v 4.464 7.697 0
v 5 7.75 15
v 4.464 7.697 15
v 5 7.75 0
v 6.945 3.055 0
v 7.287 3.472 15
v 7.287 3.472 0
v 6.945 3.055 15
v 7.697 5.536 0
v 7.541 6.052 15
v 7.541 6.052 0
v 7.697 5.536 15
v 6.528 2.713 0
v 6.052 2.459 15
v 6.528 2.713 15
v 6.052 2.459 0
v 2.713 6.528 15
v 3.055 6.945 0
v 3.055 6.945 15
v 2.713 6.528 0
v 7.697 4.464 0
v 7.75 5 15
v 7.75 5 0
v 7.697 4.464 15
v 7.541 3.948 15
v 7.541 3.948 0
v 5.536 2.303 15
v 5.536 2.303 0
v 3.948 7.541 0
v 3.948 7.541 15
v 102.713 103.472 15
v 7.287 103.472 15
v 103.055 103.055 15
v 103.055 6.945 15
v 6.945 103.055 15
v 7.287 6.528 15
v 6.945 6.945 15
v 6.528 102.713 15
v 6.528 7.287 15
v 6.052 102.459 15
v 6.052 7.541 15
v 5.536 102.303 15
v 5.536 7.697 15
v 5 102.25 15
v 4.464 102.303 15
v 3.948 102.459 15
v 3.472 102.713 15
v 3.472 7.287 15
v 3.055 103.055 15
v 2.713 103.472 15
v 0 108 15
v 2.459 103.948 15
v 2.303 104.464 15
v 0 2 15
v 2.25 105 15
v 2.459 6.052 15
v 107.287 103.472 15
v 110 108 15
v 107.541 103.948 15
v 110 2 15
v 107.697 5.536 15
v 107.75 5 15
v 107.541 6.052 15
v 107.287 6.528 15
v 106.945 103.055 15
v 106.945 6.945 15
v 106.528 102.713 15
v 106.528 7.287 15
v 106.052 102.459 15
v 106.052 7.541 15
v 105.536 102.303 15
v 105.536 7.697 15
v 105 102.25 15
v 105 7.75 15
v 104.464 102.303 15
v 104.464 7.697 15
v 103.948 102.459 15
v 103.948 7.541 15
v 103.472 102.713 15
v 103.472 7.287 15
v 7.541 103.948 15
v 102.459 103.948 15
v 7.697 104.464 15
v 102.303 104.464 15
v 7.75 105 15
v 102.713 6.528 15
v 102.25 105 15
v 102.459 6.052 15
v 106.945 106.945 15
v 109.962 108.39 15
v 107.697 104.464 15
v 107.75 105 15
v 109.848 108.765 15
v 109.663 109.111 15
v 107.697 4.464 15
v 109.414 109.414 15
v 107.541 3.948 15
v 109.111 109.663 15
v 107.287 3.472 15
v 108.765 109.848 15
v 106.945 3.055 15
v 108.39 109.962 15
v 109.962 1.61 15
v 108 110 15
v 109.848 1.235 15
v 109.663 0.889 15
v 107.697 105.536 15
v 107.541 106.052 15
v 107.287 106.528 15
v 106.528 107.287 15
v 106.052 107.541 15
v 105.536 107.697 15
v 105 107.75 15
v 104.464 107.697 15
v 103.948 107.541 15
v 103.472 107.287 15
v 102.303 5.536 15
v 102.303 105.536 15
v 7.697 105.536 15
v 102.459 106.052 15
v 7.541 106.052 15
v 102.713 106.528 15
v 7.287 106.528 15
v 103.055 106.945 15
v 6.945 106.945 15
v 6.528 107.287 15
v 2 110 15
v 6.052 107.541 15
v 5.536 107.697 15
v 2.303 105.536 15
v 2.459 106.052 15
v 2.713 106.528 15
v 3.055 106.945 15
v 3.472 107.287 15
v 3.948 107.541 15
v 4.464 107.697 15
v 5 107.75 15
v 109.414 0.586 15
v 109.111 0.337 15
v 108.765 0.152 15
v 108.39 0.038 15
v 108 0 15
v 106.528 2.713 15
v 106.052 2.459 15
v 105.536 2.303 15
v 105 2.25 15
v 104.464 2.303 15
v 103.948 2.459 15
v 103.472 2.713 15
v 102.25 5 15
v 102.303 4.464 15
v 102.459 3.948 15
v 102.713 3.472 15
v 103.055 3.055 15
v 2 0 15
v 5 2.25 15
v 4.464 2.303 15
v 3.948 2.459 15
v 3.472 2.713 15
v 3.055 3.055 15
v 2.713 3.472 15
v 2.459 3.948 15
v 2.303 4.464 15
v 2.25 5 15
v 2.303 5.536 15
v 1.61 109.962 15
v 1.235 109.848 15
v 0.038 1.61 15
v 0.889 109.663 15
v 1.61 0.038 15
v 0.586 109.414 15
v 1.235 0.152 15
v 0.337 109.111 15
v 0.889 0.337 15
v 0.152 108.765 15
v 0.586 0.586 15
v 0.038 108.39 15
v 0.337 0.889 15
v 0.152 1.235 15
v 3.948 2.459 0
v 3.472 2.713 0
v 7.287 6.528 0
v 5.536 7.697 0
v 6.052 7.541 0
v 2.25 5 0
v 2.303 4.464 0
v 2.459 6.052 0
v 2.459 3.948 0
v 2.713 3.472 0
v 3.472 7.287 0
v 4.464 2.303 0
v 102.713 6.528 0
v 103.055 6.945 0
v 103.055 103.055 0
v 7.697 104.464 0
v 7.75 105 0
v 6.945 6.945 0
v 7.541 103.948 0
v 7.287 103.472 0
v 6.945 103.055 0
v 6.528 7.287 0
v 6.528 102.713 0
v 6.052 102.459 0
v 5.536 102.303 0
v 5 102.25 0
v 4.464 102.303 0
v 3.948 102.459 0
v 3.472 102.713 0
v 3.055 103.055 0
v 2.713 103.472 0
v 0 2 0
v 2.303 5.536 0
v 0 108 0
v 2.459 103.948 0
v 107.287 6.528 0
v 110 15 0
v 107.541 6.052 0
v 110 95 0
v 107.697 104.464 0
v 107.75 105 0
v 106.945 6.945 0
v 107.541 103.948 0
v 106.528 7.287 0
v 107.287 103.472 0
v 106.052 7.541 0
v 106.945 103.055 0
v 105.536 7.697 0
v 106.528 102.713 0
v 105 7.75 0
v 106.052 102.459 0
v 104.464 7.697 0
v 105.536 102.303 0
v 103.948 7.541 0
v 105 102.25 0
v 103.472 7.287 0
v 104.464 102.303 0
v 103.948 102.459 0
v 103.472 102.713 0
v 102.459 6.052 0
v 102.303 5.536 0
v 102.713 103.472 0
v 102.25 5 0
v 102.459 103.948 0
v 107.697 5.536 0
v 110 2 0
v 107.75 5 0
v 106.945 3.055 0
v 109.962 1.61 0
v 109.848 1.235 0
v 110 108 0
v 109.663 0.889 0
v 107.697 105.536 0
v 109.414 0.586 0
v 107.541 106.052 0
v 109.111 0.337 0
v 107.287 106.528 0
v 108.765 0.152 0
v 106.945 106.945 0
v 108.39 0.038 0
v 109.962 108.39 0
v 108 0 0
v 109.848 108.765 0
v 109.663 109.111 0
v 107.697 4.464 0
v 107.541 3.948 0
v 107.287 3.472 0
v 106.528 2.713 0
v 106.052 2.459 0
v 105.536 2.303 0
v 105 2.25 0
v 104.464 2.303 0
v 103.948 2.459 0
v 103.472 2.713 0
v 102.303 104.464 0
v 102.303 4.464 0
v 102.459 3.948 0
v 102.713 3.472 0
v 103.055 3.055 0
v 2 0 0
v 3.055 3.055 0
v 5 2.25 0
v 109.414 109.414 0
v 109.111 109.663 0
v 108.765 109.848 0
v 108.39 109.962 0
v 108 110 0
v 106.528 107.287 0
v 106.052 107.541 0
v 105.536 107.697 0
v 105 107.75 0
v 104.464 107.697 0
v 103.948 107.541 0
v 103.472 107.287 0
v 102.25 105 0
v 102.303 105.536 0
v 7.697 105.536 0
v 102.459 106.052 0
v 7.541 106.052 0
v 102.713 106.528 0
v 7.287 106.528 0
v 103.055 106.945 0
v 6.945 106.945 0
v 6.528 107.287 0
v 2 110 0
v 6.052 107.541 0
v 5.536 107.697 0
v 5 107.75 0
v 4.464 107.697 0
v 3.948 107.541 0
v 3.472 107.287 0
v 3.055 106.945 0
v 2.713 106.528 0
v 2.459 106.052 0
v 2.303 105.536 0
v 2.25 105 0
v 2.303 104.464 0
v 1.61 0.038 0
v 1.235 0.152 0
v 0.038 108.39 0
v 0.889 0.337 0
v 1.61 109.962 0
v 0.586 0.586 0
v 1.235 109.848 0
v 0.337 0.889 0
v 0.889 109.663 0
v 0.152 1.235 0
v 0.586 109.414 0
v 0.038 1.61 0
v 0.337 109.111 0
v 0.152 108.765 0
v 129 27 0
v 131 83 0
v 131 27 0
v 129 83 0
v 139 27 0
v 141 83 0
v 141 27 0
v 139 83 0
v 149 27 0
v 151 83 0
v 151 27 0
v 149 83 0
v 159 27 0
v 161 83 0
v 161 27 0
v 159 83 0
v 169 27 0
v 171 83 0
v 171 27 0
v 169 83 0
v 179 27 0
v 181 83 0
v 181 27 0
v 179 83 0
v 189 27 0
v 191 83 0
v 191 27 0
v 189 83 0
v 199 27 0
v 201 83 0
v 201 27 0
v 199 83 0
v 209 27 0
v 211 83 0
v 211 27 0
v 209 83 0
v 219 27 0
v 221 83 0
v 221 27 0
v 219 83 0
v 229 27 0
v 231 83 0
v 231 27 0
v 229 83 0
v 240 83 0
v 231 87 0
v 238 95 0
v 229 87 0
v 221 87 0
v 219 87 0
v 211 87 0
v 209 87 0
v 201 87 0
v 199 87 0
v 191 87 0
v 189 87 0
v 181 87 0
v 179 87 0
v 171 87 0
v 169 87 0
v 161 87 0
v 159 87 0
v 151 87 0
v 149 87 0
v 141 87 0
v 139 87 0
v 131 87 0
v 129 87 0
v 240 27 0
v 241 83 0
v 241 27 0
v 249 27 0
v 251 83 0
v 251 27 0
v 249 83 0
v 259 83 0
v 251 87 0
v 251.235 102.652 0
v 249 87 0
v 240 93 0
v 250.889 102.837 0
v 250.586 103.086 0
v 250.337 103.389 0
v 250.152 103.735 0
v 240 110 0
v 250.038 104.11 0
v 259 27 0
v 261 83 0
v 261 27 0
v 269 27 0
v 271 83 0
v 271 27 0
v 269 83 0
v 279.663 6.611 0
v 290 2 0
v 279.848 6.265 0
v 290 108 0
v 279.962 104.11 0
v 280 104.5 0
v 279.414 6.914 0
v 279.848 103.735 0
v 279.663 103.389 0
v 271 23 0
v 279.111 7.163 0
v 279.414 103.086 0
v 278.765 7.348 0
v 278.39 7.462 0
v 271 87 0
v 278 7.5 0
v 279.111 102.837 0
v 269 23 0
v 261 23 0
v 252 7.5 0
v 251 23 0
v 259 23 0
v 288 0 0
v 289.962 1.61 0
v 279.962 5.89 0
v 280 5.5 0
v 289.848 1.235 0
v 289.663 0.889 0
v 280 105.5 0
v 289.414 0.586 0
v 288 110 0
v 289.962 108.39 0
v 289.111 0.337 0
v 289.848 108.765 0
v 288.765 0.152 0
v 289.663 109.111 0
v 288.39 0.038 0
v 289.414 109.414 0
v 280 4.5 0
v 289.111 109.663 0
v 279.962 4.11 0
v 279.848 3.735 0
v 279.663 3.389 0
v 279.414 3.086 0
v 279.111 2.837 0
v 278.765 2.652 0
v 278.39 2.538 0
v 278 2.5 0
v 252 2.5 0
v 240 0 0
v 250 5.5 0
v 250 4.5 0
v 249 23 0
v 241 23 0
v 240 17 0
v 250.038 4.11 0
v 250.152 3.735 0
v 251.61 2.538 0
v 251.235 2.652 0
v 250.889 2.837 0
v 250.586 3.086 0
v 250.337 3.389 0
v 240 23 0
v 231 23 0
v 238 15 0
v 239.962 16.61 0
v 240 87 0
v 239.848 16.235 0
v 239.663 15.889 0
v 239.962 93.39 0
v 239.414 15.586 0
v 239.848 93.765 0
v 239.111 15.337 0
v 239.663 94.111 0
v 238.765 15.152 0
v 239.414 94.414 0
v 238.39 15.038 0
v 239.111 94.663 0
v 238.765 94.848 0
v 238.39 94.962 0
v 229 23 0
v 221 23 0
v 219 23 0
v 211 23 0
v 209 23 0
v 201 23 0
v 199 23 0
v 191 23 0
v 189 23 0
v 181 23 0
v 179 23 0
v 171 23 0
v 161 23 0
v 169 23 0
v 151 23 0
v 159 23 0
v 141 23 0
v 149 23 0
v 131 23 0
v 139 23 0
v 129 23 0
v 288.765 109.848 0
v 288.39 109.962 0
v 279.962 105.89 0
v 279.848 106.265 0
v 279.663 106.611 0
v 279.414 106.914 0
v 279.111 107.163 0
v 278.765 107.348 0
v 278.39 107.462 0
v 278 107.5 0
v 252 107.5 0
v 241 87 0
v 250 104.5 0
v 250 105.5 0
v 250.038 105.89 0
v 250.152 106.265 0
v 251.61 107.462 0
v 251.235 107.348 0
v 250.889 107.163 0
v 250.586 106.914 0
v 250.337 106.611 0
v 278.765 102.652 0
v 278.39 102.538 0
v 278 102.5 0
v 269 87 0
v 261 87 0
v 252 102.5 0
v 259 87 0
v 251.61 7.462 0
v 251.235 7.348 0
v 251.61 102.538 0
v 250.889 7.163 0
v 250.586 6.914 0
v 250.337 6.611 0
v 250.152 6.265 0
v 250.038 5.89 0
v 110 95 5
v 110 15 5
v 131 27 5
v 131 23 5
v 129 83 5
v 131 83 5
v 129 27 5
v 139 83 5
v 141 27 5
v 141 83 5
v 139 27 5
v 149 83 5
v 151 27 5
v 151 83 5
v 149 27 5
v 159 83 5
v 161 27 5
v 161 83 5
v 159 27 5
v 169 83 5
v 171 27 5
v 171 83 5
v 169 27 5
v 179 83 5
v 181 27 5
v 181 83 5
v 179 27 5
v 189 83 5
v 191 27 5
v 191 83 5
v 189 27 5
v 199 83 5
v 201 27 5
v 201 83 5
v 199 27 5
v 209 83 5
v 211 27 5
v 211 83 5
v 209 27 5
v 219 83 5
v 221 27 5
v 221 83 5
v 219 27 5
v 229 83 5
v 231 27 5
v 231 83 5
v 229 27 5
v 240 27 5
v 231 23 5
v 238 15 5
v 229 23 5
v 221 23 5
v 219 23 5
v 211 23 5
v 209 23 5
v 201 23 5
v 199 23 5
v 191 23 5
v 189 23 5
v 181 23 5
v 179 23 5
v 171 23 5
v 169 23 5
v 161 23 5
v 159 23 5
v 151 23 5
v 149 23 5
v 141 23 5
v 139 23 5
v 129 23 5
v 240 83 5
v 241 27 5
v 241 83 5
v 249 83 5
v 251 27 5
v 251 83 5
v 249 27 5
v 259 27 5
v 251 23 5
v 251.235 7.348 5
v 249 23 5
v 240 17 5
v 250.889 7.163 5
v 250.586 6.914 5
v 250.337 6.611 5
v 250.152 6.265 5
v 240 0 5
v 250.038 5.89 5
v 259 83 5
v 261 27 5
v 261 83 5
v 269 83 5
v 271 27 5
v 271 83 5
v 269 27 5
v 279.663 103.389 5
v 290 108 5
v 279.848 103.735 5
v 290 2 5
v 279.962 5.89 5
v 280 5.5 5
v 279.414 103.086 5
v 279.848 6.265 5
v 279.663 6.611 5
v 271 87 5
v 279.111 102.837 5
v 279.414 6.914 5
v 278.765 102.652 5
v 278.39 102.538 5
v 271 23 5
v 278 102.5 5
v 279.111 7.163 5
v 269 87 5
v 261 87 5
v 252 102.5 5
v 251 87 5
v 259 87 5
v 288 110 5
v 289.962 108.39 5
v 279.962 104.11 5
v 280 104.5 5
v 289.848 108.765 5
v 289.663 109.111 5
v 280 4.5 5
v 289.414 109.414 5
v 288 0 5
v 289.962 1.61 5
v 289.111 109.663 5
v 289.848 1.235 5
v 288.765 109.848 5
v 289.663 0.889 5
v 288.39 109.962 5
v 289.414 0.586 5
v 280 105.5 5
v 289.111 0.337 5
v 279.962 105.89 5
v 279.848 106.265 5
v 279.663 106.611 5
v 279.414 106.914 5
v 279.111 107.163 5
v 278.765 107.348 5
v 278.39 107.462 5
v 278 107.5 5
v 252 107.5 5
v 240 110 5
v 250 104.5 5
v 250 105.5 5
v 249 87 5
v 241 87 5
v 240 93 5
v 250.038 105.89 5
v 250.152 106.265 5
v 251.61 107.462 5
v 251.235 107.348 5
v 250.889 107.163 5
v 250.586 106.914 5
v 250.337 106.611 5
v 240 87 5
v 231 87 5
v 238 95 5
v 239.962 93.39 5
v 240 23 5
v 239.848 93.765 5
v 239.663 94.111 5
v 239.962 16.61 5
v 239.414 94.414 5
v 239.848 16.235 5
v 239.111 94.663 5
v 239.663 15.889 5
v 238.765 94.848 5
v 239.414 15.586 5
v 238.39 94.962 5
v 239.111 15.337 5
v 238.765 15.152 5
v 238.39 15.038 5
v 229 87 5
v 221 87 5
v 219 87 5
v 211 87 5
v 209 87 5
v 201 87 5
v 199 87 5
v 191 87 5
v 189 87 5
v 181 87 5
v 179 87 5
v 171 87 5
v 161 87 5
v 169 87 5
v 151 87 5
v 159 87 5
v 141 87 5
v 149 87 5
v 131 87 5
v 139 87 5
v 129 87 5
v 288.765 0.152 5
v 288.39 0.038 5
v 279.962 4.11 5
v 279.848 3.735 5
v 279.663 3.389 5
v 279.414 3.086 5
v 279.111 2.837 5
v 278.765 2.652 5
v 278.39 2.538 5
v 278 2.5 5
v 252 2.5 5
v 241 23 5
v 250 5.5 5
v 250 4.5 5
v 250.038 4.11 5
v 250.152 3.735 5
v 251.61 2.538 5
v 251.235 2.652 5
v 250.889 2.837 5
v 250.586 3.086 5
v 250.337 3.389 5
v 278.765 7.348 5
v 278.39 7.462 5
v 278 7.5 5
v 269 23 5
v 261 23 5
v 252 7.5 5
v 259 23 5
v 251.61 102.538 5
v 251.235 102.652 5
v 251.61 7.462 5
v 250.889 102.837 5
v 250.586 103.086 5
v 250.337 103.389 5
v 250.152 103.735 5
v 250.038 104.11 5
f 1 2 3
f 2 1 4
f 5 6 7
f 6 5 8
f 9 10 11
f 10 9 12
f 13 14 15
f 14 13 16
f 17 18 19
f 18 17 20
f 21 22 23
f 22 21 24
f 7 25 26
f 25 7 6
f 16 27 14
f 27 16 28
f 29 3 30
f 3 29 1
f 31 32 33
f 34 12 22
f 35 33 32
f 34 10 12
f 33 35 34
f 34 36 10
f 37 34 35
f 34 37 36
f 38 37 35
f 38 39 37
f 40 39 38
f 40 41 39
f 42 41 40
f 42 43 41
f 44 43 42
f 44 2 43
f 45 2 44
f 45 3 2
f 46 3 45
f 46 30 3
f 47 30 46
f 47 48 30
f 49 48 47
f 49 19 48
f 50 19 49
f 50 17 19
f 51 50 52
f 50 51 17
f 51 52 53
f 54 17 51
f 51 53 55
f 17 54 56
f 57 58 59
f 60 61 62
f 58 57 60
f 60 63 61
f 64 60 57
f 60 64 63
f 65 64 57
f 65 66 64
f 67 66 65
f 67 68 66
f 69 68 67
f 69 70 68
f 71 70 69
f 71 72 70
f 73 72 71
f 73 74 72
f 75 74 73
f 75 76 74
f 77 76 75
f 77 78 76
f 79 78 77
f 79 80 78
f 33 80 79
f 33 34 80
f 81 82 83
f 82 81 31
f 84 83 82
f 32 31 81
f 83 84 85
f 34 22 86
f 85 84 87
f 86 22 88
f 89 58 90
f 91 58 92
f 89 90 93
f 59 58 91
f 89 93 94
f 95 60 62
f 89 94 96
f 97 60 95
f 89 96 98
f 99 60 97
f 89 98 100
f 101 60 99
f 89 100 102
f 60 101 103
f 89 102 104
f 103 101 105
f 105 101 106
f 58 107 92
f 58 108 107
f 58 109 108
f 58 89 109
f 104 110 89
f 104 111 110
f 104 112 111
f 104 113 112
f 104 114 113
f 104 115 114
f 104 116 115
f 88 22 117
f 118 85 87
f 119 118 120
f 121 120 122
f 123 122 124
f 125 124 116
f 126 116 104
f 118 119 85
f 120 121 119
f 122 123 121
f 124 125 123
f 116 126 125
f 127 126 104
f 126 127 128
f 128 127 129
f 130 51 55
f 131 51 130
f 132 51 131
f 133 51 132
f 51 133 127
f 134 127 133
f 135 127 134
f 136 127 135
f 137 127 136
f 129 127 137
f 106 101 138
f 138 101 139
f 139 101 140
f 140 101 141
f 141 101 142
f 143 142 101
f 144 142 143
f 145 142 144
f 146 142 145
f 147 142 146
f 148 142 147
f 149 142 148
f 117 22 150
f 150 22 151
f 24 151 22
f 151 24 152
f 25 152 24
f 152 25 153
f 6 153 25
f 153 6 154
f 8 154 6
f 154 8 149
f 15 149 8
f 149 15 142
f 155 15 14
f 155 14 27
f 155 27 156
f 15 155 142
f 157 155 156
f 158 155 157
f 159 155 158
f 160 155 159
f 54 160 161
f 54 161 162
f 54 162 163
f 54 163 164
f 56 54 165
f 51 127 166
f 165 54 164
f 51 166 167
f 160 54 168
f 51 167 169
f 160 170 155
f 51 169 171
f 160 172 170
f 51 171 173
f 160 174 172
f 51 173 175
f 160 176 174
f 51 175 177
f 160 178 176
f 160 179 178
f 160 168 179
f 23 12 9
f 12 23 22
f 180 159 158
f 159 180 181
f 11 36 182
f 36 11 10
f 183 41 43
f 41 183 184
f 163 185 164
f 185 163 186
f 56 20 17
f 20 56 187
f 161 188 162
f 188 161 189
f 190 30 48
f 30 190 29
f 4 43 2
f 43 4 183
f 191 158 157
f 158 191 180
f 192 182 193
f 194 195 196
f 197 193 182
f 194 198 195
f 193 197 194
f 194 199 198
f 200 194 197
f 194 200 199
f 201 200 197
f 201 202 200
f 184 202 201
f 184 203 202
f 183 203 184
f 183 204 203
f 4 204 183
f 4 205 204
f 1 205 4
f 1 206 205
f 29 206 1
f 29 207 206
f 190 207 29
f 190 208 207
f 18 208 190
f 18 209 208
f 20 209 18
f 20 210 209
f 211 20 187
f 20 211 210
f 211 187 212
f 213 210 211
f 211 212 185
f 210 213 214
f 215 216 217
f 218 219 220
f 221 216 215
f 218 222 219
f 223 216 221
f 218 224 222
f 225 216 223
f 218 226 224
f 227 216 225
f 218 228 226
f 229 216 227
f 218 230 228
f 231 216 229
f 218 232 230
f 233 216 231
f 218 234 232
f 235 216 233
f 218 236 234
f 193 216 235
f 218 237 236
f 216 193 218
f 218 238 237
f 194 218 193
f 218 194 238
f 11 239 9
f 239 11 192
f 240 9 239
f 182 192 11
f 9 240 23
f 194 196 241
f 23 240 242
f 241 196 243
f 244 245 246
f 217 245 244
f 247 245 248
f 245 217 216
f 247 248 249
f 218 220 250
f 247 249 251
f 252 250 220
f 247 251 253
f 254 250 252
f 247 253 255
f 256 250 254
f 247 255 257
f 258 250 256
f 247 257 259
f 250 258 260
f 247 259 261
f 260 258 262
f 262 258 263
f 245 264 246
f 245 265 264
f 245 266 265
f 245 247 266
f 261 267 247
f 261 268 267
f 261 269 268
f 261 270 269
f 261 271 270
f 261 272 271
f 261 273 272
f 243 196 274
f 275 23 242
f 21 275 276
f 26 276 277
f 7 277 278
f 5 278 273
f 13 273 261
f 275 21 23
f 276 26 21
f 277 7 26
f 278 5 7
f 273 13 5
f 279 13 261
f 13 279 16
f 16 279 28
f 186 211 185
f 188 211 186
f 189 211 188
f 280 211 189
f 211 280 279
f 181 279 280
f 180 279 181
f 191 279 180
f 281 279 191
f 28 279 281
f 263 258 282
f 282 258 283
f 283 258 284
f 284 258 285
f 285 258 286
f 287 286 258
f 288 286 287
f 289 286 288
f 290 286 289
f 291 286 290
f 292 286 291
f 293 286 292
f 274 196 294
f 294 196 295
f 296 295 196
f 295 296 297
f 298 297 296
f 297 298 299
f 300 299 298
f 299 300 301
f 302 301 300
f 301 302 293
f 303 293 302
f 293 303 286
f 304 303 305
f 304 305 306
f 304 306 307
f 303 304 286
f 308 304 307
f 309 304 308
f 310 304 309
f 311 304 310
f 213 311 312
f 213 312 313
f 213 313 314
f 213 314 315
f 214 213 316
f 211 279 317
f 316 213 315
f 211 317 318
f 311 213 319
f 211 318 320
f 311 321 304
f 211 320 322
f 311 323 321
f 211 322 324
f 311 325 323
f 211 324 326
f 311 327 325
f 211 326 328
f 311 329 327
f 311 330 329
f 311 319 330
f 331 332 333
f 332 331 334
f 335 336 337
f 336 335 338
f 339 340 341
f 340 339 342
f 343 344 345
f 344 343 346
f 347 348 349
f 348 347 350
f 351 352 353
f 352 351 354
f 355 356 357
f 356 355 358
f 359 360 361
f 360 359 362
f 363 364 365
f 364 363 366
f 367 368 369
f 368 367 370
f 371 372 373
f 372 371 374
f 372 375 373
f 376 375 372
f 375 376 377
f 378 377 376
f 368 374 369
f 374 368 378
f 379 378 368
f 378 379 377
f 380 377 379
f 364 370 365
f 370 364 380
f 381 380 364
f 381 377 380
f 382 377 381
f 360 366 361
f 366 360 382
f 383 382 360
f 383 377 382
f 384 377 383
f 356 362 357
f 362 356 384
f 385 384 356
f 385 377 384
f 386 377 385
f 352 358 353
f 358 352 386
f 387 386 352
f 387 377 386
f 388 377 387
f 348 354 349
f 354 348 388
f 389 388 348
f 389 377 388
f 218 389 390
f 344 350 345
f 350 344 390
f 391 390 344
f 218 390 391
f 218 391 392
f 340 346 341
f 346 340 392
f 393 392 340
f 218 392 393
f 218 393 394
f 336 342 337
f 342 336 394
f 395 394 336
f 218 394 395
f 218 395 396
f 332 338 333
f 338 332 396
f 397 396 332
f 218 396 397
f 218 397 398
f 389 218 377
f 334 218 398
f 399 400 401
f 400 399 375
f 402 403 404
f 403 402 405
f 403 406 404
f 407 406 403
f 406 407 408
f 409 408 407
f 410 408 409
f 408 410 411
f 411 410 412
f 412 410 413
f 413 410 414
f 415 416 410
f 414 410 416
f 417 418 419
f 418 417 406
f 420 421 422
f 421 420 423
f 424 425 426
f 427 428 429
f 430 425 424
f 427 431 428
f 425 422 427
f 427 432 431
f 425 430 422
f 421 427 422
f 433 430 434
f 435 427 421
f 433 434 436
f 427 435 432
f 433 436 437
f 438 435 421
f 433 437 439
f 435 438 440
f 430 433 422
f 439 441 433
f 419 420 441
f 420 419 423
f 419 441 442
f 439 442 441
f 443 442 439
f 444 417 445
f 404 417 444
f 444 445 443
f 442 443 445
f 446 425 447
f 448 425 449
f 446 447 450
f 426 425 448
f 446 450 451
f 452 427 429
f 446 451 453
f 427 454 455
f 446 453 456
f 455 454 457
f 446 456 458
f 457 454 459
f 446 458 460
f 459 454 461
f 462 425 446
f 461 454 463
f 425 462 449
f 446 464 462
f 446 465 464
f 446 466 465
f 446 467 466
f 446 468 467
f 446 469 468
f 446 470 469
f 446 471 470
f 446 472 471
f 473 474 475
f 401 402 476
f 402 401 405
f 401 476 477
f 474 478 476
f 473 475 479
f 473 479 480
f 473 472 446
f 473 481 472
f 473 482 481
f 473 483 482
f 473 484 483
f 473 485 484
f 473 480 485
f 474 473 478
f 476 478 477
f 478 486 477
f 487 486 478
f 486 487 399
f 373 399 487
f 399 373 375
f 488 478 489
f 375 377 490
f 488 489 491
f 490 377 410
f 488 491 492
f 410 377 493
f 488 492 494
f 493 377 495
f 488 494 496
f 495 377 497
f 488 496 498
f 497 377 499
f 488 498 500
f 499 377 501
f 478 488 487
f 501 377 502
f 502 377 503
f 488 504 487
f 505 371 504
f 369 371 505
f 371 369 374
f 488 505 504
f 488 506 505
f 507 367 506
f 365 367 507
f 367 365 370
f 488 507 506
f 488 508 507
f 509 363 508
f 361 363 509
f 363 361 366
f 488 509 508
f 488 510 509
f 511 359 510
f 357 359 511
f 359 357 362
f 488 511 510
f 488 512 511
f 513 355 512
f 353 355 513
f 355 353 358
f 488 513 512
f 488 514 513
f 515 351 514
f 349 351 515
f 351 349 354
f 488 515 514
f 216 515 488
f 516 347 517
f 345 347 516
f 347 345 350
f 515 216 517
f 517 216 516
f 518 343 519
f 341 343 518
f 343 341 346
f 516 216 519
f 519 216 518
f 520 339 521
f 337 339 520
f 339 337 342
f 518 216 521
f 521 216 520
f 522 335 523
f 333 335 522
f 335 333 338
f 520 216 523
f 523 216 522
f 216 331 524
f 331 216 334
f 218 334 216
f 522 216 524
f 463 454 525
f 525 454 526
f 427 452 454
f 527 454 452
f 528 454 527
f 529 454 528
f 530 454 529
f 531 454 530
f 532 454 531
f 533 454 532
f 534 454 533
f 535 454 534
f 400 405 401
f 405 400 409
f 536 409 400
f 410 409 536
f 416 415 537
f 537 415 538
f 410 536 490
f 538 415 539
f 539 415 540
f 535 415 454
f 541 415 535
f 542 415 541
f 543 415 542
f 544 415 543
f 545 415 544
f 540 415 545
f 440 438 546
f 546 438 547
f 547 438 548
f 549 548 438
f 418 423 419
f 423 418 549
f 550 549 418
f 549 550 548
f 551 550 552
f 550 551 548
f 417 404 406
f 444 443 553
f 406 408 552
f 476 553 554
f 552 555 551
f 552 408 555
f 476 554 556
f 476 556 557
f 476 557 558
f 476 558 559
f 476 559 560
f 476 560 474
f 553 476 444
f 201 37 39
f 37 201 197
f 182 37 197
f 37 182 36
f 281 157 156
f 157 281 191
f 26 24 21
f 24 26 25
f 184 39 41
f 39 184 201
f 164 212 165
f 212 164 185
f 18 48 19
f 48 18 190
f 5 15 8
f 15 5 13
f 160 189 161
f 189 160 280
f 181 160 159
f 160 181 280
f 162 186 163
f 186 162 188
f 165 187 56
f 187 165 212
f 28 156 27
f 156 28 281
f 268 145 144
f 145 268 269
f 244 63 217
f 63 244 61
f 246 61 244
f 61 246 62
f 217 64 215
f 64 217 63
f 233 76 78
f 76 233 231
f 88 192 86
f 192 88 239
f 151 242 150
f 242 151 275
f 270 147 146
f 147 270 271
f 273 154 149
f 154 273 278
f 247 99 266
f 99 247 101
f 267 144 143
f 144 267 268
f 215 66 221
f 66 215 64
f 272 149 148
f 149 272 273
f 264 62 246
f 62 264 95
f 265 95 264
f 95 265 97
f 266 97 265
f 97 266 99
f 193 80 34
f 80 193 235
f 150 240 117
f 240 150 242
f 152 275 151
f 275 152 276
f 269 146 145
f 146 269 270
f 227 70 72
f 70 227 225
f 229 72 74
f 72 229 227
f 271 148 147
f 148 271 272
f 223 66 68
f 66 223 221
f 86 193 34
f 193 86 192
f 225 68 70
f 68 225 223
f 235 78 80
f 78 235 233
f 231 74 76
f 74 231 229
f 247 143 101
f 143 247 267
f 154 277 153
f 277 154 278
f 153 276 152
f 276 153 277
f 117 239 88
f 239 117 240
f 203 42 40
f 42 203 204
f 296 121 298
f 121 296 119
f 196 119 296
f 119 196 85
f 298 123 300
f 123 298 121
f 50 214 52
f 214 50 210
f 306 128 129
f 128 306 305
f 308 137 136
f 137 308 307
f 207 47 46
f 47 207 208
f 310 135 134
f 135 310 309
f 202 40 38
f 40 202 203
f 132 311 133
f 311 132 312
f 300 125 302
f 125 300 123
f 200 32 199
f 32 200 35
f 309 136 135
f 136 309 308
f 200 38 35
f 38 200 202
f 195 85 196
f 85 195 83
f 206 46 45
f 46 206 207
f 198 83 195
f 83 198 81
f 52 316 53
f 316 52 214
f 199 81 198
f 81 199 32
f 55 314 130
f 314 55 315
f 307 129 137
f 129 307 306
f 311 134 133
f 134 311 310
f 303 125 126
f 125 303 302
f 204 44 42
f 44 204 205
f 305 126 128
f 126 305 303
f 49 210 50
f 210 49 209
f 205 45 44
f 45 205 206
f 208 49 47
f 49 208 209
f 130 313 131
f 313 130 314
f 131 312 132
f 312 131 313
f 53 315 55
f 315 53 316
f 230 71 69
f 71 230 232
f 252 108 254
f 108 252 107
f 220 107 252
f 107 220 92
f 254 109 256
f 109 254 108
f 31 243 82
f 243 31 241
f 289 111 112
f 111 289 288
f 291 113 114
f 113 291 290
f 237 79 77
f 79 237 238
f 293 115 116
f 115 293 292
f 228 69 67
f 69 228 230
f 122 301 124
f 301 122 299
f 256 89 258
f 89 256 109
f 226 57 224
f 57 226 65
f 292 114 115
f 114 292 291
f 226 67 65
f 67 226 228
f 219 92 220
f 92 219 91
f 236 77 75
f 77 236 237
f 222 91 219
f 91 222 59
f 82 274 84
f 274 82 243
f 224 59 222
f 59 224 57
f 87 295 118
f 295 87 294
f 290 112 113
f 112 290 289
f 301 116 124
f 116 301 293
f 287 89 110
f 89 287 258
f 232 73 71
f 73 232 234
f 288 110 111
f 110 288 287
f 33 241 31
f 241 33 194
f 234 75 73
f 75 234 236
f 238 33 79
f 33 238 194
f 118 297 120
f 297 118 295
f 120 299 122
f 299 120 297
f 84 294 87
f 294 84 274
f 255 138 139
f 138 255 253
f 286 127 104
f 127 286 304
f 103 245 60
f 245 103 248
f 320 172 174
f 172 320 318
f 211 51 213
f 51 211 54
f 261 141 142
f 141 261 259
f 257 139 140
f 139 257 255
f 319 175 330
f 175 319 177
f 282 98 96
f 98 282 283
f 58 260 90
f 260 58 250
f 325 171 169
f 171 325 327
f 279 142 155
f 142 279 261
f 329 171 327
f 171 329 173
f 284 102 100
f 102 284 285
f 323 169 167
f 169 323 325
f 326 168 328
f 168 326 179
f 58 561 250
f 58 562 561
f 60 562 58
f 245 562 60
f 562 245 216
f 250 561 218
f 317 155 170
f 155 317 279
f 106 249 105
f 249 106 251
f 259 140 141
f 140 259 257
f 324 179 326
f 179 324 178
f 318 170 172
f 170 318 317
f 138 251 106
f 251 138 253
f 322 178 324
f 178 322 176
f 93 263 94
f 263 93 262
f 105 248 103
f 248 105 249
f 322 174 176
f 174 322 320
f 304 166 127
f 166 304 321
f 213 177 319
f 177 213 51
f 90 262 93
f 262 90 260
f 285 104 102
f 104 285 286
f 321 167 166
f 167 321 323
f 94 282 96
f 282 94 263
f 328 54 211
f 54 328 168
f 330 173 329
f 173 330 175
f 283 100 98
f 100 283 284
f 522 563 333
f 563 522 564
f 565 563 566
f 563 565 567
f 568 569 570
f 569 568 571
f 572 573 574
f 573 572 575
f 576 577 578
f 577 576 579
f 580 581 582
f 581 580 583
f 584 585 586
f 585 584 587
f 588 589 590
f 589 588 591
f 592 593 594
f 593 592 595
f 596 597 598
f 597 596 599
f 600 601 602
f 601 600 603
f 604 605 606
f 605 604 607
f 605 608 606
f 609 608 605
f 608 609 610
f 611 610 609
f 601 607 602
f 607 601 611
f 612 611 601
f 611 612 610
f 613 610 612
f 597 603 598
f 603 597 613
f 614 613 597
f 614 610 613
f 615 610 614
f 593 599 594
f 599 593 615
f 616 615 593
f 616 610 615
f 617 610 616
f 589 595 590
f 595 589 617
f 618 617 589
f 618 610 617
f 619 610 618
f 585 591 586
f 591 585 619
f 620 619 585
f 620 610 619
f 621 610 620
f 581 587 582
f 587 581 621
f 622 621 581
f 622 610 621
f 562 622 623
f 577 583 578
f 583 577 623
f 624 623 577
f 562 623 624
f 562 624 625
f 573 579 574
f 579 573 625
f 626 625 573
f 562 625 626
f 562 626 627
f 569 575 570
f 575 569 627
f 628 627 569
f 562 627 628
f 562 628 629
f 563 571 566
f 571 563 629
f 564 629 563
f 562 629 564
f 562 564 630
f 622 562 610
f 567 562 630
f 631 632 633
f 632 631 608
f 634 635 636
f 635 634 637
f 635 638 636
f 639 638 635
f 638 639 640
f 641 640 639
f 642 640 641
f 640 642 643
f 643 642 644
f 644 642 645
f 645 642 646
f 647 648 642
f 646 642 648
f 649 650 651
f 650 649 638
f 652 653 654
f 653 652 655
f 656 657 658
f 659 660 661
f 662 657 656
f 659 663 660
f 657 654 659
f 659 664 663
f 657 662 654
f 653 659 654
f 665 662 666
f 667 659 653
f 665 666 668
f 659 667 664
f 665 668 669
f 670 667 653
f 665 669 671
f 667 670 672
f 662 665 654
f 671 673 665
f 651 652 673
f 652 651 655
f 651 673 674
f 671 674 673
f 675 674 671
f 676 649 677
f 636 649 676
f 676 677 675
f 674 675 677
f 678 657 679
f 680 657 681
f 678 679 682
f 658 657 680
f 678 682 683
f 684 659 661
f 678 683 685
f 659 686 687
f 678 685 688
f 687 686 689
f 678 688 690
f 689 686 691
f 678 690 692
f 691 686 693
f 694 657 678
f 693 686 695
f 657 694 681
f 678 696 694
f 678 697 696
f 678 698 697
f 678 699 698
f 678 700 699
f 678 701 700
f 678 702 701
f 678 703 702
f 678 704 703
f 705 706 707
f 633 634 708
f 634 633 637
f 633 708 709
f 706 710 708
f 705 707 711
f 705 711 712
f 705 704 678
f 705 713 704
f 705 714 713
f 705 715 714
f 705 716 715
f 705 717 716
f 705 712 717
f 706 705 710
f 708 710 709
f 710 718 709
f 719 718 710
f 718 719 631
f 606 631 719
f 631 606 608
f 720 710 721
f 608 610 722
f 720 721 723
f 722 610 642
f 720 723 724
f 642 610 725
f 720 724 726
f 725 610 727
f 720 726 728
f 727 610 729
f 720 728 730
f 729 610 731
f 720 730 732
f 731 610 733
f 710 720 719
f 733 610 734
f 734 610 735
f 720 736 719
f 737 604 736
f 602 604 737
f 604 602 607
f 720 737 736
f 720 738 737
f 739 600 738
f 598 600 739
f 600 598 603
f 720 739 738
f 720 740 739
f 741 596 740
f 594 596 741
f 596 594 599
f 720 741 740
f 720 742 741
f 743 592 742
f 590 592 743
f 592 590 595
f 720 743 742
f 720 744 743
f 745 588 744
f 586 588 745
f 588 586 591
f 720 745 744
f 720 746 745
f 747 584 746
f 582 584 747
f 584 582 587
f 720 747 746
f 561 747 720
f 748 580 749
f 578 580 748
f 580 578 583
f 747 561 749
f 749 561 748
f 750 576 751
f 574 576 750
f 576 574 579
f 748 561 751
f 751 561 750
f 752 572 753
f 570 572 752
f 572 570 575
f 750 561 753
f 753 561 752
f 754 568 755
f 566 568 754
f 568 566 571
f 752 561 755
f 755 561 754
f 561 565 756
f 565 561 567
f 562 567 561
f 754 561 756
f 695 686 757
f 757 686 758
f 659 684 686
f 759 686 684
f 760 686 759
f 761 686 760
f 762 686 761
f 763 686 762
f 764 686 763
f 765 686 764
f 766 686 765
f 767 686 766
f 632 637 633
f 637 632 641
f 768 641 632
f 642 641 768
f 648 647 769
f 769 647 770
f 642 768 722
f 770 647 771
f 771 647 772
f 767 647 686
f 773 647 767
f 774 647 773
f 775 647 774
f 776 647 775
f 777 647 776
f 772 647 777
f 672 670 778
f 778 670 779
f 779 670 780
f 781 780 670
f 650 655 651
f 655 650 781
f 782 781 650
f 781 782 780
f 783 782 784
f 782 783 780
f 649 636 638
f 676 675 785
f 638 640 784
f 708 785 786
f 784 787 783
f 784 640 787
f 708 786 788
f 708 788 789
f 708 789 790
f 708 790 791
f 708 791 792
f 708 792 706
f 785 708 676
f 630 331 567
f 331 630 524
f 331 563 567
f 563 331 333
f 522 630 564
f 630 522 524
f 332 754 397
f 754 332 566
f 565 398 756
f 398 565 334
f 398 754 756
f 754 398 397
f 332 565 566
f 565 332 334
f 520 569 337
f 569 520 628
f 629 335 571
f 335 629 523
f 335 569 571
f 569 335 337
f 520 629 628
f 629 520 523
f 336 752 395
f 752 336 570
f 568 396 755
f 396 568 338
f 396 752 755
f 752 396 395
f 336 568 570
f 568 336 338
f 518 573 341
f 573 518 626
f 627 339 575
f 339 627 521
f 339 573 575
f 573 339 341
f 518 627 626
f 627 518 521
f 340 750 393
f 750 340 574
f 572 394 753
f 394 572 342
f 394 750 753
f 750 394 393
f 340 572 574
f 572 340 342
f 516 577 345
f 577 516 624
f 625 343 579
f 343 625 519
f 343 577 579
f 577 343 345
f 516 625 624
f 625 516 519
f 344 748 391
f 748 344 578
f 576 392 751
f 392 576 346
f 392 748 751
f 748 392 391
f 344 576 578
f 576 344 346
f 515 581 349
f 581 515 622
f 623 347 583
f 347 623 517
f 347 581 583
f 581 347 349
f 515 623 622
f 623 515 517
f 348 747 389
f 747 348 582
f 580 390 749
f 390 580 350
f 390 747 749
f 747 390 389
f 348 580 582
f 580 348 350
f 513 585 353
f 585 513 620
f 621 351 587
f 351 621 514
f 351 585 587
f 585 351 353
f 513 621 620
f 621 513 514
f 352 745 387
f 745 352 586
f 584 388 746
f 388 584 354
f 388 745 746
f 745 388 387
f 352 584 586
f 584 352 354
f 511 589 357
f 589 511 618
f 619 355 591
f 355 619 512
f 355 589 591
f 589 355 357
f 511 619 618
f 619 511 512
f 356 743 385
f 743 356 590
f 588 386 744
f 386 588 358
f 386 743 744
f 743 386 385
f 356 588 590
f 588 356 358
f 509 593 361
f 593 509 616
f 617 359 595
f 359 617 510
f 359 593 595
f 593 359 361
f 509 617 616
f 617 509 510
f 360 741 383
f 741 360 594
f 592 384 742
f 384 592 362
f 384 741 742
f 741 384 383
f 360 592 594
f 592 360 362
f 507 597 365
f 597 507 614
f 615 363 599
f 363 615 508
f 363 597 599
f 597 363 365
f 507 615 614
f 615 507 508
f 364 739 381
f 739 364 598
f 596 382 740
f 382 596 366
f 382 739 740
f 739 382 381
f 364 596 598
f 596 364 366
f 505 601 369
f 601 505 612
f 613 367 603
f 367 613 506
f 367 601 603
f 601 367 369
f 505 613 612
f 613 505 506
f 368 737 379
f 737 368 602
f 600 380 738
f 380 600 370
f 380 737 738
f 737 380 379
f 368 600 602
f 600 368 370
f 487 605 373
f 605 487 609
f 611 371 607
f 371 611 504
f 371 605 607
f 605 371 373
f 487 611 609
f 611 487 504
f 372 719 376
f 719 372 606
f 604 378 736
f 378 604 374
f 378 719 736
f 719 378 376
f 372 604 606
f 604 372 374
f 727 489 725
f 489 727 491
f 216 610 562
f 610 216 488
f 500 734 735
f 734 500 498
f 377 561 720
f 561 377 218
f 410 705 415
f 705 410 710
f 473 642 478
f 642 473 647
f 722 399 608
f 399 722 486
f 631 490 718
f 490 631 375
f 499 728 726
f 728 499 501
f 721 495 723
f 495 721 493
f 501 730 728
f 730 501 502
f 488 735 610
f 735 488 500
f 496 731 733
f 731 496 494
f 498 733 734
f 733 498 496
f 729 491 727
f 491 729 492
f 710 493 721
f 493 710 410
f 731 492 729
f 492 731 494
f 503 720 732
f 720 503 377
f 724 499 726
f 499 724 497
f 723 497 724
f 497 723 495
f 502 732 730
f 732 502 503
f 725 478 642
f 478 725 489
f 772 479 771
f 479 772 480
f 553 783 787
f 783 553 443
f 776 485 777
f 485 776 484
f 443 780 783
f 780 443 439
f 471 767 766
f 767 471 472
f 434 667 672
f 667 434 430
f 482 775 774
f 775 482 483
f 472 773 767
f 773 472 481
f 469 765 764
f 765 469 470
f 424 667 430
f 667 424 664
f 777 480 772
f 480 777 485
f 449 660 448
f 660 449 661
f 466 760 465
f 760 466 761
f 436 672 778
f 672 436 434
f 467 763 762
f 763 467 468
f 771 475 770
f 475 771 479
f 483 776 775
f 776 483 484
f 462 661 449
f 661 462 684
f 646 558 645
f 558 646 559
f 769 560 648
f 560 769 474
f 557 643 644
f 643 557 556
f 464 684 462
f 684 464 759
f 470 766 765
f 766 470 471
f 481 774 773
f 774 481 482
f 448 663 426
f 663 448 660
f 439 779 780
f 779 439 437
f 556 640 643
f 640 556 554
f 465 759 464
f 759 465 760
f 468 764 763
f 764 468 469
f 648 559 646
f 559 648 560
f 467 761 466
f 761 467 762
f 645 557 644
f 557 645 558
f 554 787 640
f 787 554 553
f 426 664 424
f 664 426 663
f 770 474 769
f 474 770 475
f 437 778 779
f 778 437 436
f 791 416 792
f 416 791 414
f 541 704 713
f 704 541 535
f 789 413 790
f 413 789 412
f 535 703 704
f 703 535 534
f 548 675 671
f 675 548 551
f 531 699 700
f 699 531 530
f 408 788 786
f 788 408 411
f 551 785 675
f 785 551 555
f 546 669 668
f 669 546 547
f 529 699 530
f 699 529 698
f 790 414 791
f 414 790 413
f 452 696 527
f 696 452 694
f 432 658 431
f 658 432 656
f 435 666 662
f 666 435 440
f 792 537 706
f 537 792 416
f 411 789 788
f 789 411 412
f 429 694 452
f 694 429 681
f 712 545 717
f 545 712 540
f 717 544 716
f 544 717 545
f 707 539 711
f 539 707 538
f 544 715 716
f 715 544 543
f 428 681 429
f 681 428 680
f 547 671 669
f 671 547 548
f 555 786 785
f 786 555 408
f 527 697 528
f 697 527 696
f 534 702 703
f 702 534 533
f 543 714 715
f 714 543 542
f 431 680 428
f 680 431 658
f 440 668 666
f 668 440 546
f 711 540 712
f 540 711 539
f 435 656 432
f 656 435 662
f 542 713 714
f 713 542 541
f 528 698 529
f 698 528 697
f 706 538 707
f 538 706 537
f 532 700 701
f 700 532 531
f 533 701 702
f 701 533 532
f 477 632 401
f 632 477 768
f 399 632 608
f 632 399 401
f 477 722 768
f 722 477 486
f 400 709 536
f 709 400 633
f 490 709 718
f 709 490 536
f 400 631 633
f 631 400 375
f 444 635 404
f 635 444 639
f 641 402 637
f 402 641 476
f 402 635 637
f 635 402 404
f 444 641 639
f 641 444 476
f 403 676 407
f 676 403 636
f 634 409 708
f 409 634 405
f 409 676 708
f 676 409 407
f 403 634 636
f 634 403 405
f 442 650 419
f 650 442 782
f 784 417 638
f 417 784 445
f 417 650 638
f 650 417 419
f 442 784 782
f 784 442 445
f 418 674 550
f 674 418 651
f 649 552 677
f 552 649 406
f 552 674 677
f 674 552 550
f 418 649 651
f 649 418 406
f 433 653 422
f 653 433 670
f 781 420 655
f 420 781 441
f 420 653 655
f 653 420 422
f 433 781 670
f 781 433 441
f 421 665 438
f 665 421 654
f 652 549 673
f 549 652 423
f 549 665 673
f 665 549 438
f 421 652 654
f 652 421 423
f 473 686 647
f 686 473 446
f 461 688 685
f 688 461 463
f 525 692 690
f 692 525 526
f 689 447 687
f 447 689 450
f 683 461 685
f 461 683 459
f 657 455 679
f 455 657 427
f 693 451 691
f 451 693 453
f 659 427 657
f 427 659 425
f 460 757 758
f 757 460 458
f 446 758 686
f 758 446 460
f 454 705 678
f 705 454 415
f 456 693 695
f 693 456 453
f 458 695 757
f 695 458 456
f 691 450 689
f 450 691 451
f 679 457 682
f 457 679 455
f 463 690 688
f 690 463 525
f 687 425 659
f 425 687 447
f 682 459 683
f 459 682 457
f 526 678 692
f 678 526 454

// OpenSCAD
/**
 * Monitor Mount Base Plate
 *
 * A VESA-compatible mounting base for monitor attachment.
 *
 * Coordinate System:
 *   X = Width  (positive = right)
 *   Y = Depth  (positive = back/away from viewer)
 *   Z = Height (positive = up)
 *
 * Origin: Front-left corner of base plate, at ground level
 */

// ===========================================
// DIMENSIONS (all values in millimeters)
// ===========================================

// --- Global / Shared Dimensions ---
vesa_hole_spacing_mm   = 100;   // VESA 100x100 standard
m5_hole_diameter_mm    = 5.5;   // M5 screw clearance hole

// --- base_plate dimensions ---
base_plate_width_mm    = 110;   // X dimension
base_plate_depth_mm    = 110;   // Y dimension
base_plate_height_mm   = 15;    // Z dimension
base_plate_edge_radius_mm = 2;  // Radius of curved edges on sides

// --- arm dimensions ---
arm_length_mm          = 130;   // X dimension (extends right from base)
arm_width_mm           = 80;    // Y dimension
arm_height_mm          = 5;     // Z dimension
arm_edge_radius_mm     = 2;     // Radius of curved edges (front, back, right only)
arm_y_offset_mm        = (base_plate_depth_mm - arm_width_mm) / 2;  // Centers arm on base (15mm)

// --- usb_mount dimensions ---
usb_mount_length_mm    = 50;    // X dimension (extends right from arm)
usb_mount_width_mm     = 110;   // Y dimension (same as base plate)
usb_mount_height_mm    = 5;     // Z dimension
usb_mount_edge_radius_mm = 2;   // Radius of curved edges

// --- lcd_mount_hole dimensions ---
lcd_mount_hole_length_mm    = 30;   // X dimension (slot length)
lcd_mount_hole_width_mm     = 5;    // Y dimension (slot width)
lcd_mount_hole_corner_radius_mm = 2;  // Inside corner radius
lcd_mount_hole_spacing_mm   = 100;  // Distance between hole centers in Y
lcd_mount_hole_y_offset_mm  = (usb_mount_width_mm - lcd_mount_hole_spacing_mm) / 2;  // 5mm from edges

// --- zip_tie_hole dimensions ---
zip_tie_hole_length_mm      = 2;    // X dimension (slot length)
zip_tie_hole_width_mm       = 4;    // Y dimension (slot width)
zip_tie_hole_spacing_mm     = 60;   // Distance between hole centers in Y
zip_tie_hole_start_x_mm     = 130;  // First hole X position (from origin)
zip_tie_hole_repeat_mm      = 10;   // Repeat interval in X
zip_tie_hole_end_margin_mm  = 20;   // Stop this far from end of usb_mount
zip_tie_hole_center_y_mm    = base_plate_depth_mm / 2;  // Center Y (55mm)

// ===========================================
// COMPONENT INDEX
// ===========================================
/**
 * | Component        | Origin [X,Y,Z]  | Size [W,D,H]      | Attaches To      |
 * |------------------|-----------------|-------------------|------------------|
 * | base_plate       | [0, 0, 0]       | [110, 110, 15]    | (ground/mount)   |
 * | arm              | [110, 15, 0]    | [130, 80, 5]      | base_plate right |
 * | usb_mount        | [240, 0, 0]     | [50, 110, 5]      | arm right        |
 * | zip_tie_holes    | [130, 25/85, 0] | [2, 4, 5] each    | arm, usb_mount   |
 *
 */

// ===========================================
// CONNECTION INTERFACES
// ===========================================

// Center point of the base plate (for VESA hole pattern)
function base_plate_center() = [
    base_plate_width_mm / 2,
    base_plate_depth_mm / 2,
    0
];

// VESA hole positions (centered on base plate)
function vesa_hole_positions() = [
    base_plate_center() + [-vesa_hole_spacing_mm/2, -vesa_hole_spacing_mm/2, 0],
    base_plate_center() + [ vesa_hole_spacing_mm/2, -vesa_hole_spacing_mm/2, 0],
    base_plate_center() + [-vesa_hole_spacing_mm/2,  vesa_hole_spacing_mm/2, 0],
    base_plate_center() + [ vesa_hole_spacing_mm/2,  vesa_hole_spacing_mm/2, 0]
];

// Arm attachment point (right edge of base plate, centered in Y)
function arm_attachment_point() = [
    base_plate_width_mm,
    arm_y_offset_mm,
    0
];

// USB mount attachment point (right edge of arm, aligned with base Y origin)
function usb_mount_attachment_point() = [
    base_plate_width_mm + arm_length_mm,
    0,
    0
];

// LCD mount hole positions (centered on USB mount in X, spaced in Y)
function lcd_mount_hole_positions() = [
    [usb_mount_length_mm / 2, lcd_mount_hole_y_offset_mm, 0],
    [usb_mount_length_mm / 2, usb_mount_width_mm - lcd_mount_hole_y_offset_mm, 0]
];

// Zip tie hole end X position
zip_tie_hole_end_x_mm = base_plate_width_mm + arm_length_mm + usb_mount_length_mm - zip_tie_hole_end_margin_mm;

// Number of zip tie hole positions
zip_tie_hole_count = floor((zip_tie_hole_end_x_mm - zip_tie_hole_start_x_mm) / zip_tie_hole_repeat_mm) + 1;

// Zip tie hole Y positions (two holes per X position, 60mm apart centered on arm)
function zip_tie_hole_y_positions() = [
    zip_tie_hole_center_y_mm - zip_tie_hole_spacing_mm / 2,  // 25mm
    zip_tie_hole_center_y_mm + zip_tie_hole_spacing_mm / 2   // 85mm
];

// ===========================================
// MODULES
// ===========================================

/**
 * Base Plate Body (with rounded side edges)
 *
 * Creates the main body with 2mm radius curves on the four
 * vertical edges (sides), but flat top and bottom surfaces.
 *
 * POSITION:
 *   Origin: [0, 0, 0] (front-left-bottom corner)
 *
 * BOUNDING BOX:
 *   Min: [0, 0, 0]
 *   Max: [110, 110, 15]
 *   Size: [110, 110, 15]
 */
module base_plate_body() {
    // Use hull of four cylinders at corners to create rounded vertical edges
    // This gives us curved sides but flat top/bottom
    r = base_plate_edge_radius_mm;

    hull() {
        // Front-left corner
        translate([r, r, 0])
            cylinder(h = base_plate_height_mm, r = r, $fn = 32);

        // Front-right corner
        translate([base_plate_width_mm - r, r, 0])
            cylinder(h = base_plate_height_mm, r = r, $fn = 32);

        // Back-left corner
        translate([r, base_plate_depth_mm - r, 0])
            cylinder(h = base_plate_height_mm, r = r, $fn = 32);

        // Back-right corner
        translate([base_plate_width_mm - r, base_plate_depth_mm - r, 0])
            cylinder(h = base_plate_height_mm, r = r, $fn = 32);
    }
}

/**
 * VESA Mounting Holes
 *
 * Creates four M5 clearance holes in VESA 100x100 pattern,
 * centered on the base plate.
 */
module vesa_holes() {
    positions = vesa_hole_positions();

    for (pos = positions) {
        translate(pos)
            cylinder(h = base_plate_height_mm, d = m5_hole_diameter_mm, $fn = 32);
    }
}

/**
 * Base Plate
 *
 * Complete base plate with VESA mounting holes.
 *
 * POSITION:
 *   Origin: [0, 0, 0] (front-left-bottom corner)
 *
 * BOUNDING BOX:
 *   Min: [0, 0, 0]
 *   Max: [110, 110, 15]
 *   Size: [110, 110, 15]
 *
 * ALIGNMENT:
 *   X: Starts at origin
 *   Y: Starts at origin
 *   Z: Sits on ground plane (z = 0)
 *
 * CONNECTS TO:
 *   - VESA mount: bottom surface with 4x M5 holes
 *   - arm: right edge at Y center
 */
module base_plate() {
    difference() {
        base_plate_body();
        vesa_holes();
    }
}

/**
 * Arm Body
 *
 * Creates the arm body with 2mm radius curves on front, back,
 * and right edges. Left edge is straight (attaches to base plate).
 *
 * Local origin at [0, 0, 0] - positioned by arm() module.
 */
module arm_body() {
    r = arm_edge_radius_mm;
    eps = 0.001;  // Small value for sharp corners

    hull() {
        // Left edge - sharp corners (no radius)
        // Front-left corner
        translate([0, 0, 0])
            cube([eps, eps, arm_height_mm]);

        // Back-left corner
        translate([0, arm_width_mm - eps, 0])
            cube([eps, eps, arm_height_mm]);

        // Right edge - rounded corners (2mm radius)
        // Front-right corner
        translate([arm_length_mm - r, r, 0])
            cylinder(h = arm_height_mm, r = r, $fn = 32);

        // Back-right corner
        translate([arm_length_mm - r, arm_width_mm - r, 0])
            cylinder(h = arm_height_mm, r = r, $fn = 32);
    }
}

/**
 * Arm
 *
 * Horizontal arm extending from the right side of the base plate.
 *
 * POSITION:
 *   Origin: [110, 15, 0] (front-left-bottom corner of arm)
 *
 * BOUNDING BOX:
 *   Min: [110, 15, 0]
 *   Max: [240, 95, 5]
 *   Size: [130, 80, 5]
 *
 * ALIGNMENT:
 *   X: Starts at right edge of base_plate (x = 110)
 *   Y: Centered on base_plate (15mm from front edge)
 *   Z: Sits on ground plane (z = 0)
 *
 * CONNECTS TO:
 *   - base_plate: left edge flush with base_plate right edge
 *   - usb_mount: right edge connects to usb_mount left edge
 *
 * FEATURES:
 *   - Zip tie holes every 10mm from x=130 to x=240
 */
module arm() {
    translate(arm_attachment_point())
        difference() {
            arm_body();
            zip_tie_holes_arm();
        }
}

/**
 * USB Mount Body
 *
 * Creates the USB mount body with 2mm radius curves on front, back,
 * and right edges. Left edge is straight (attaches to arm).
 *
 * Local origin at [0, 0, 0] - positioned by usb_mount() module.
 */
module usb_mount_body() {
    r = usb_mount_edge_radius_mm;
    eps = 0.001;  // Small value for sharp corners

    hull() {
        // Left edge - sharp corners (no radius)
        // Front-left corner
        translate([0, 0, 0])
            cube([eps, eps, usb_mount_height_mm]);

        // Back-left corner
        translate([0, usb_mount_width_mm - eps, 0])
            cube([eps, eps, usb_mount_height_mm]);

        // Right edge - rounded corners (2mm radius)
        // Front-right corner
        translate([usb_mount_length_mm - r, r, 0])
            cylinder(h = usb_mount_height_mm, r = r, $fn = 32);

        // Back-right corner
        translate([usb_mount_length_mm - r, usb_mount_width_mm - r, 0])
            cylinder(h = usb_mount_height_mm, r = r, $fn = 32);
    }
}

/**
 * LCD Mount Hole
 *
 * Creates a single slot cutout with rounded inside corners.
 * 30mm long (X) x 5mm wide (Y) with 2mm corner radius.
 *
 * Local origin at center of hole.
 */
module lcd_mount_hole() {
    r = lcd_mount_hole_corner_radius_mm;
    // Effective inner dimensions after accounting for corner radius
    inner_length = lcd_mount_hole_length_mm - 2 * r;
    inner_width = lcd_mount_hole_width_mm - 2 * r;

    // Use hull of 4 cylinders at corners for rounded rectangle
    hull() {
        // Front-left corner
        translate([-inner_length/2, -inner_width/2, 0])
            cylinder(h = usb_mount_height_mm, r = r, $fn = 32);

        // Front-right corner
        translate([inner_length/2, -inner_width/2, 0])
            cylinder(h = usb_mount_height_mm, r = r, $fn = 32);

        // Back-left corner
        translate([-inner_length/2, inner_width/2, 0])
            cylinder(h = usb_mount_height_mm, r = r, $fn = 32);

        // Back-right corner
        translate([inner_length/2, inner_width/2, 0])
            cylinder(h = usb_mount_height_mm, r = r, $fn = 32);
    }
}

/**
 * LCD Mount Holes
 *
 * Creates both LCD mount hole cutouts, positioned symmetrically
 * on the USB mount.
 */
module lcd_mount_holes() {
    positions = lcd_mount_hole_positions();

    for (pos = positions) {
        translate(pos)
            lcd_mount_hole();
    }
}

/**
 * Zip Tie Hole
 *
 * Creates a single rectangular slot for zip ties.
 * 2mm long (X) x 4mm wide (Y), through full material thickness.
 *
 * Local origin at center of hole.
 */
module zip_tie_hole(height) {
    translate([-zip_tie_hole_length_mm/2, -zip_tie_hole_width_mm/2, 0])
        cube([zip_tie_hole_length_mm, zip_tie_hole_width_mm, height]);
}

/**
 * Zip Tie Holes for Arm
 *
 * Creates all zip tie holes that fall within the arm's X range.
 * Holes are positioned in global coordinates, then translated
 * to arm's local coordinate system.
 *
 * X range on arm: 130 to 240 (local: 20 to 130)
 */
module zip_tie_holes_arm() {
    y_positions = zip_tie_hole_y_positions();
    arm_start_x = base_plate_width_mm;  // 110
    arm_end_x = base_plate_width_mm + arm_length_mm;  // 240

    for (i = [0 : zip_tie_hole_count - 1]) {
        x_global = zip_tie_hole_start_x_mm + i * zip_tie_hole_repeat_mm;

        // Only create holes within arm's X range
        if (x_global >= arm_start_x && x_global < arm_end_x) {
            x_local = x_global - arm_start_x;

            for (y_global = y_positions) {
                y_local = y_global - arm_y_offset_mm;

                translate([x_local, y_local, 0])
                    zip_tie_hole(arm_height_mm);
            }
        }
    }
}

/**
 * Zip Tie Holes for USB Mount
 *
 * Creates all zip tie holes that fall within the USB mount's X range.
 * Holes are positioned in global coordinates, then translated
 * to USB mount's local coordinate system.
 *
 * X range on usb_mount: 240 to 270 (local: 0 to 30)
 */
module zip_tie_holes_usb_mount() {
    y_positions = zip_tie_hole_y_positions();
    usb_start_x = base_plate_width_mm + arm_length_mm;  // 240

    for (i = [0 : zip_tie_hole_count - 1]) {
        x_global = zip_tie_hole_start_x_mm + i * zip_tie_hole_repeat_mm;

        // Only create holes within usb_mount's X range
        if (x_global >= usb_start_x && x_global <= zip_tie_hole_end_x_mm) {
            x_local = x_global - usb_start_x;

            for (y_global = y_positions) {
                // Y is in global coords for usb_mount (starts at y=0)
                translate([x_local, y_global, 0])
                    zip_tie_hole(usb_mount_height_mm);
            }
        }
    }
}

/**
 * USB Mount
 *
 * Mounting platform at the end of the arm for USB monitor attachment.
 * Includes two LCD mount hole cutouts and zip tie holes.
 *
 * POSITION:
 *   Origin: [240, 0, 0] (front-left-bottom corner of usb_mount)
 *
 * BOUNDING BOX:
 *   Min: [240, 0, 0]
 *   Max: [290, 110, 5]
 *   Size: [50, 110, 5]
 *
 * ALIGNMENT:
 *   X: Starts at right edge of arm (x = 240)
 *   Y: Aligned with base_plate (y = 0)
 *   Z: Sits on ground plane (z = 0)
 *
 * CONNECTS TO:
 *   - arm: left edge flush with arm right edge
 *
 * FEATURES:
 *   - Two LCD mount holes (30mm x 5mm with 2mm rounded corners)
 *   - Holes centered in X, spaced 100mm apart in Y
 *   - Zip tie holes every 10mm from x=240 to x=270
 */
module usb_mount() {
    translate(usb_mount_attachment_point())
        difference() {
            usb_mount_body();
            lcd_mount_holes();
            zip_tie_holes_usb_mount();
        }
}

// ===========================================
// DEBUG / VISUALIZATION
// ===========================================

// Render coordinate axes at origin (length = 50mm)
module debug_axes(length = 50) {
    color("red")   cylinder(h = length, r = 1, $fn = 16);           // Z-axis
    color("green") rotate([0, 90, 0]) cylinder(h = length, r = 1, $fn = 16);  // X-axis
    color("blue")  rotate([-90, 0, 0]) cylinder(h = length, r = 1, $fn = 16); // Y-axis
}

// Show bounding box for a component (transparent)
module debug_bounds(min_pt, max_pt) {
    color("yellow", 0.2)
        translate(min_pt)
            cube([max_pt[0] - min_pt[0], max_pt[1] - min_pt[1], max_pt[2] - min_pt[2]]);
}

// Color-coded assembly for visual debugging
module assembly_colored() {
    color("gray") base_plate();
    color("blue") arm();
    color("green") usb_mount();
}

// Exploded view - separates components along X axis
module assembly_exploded(separation = 30) {
    translate([0, 0, 0]) base_plate();
    translate([separation, 0, 0]) arm();
    translate([separation * 2, 0, 0]) usb_mount();
}

// ===========================================
// ASSEMBLY
// ===========================================

/**
 * Main Assembly
 *
 * Combines all components in their final positions.
 * Use assembly_colored() or assembly_exploded() for debugging.
 */
module assembly() {
    base_plate();
    arm();
    usb_mount();
}

// Default render
assembly();
